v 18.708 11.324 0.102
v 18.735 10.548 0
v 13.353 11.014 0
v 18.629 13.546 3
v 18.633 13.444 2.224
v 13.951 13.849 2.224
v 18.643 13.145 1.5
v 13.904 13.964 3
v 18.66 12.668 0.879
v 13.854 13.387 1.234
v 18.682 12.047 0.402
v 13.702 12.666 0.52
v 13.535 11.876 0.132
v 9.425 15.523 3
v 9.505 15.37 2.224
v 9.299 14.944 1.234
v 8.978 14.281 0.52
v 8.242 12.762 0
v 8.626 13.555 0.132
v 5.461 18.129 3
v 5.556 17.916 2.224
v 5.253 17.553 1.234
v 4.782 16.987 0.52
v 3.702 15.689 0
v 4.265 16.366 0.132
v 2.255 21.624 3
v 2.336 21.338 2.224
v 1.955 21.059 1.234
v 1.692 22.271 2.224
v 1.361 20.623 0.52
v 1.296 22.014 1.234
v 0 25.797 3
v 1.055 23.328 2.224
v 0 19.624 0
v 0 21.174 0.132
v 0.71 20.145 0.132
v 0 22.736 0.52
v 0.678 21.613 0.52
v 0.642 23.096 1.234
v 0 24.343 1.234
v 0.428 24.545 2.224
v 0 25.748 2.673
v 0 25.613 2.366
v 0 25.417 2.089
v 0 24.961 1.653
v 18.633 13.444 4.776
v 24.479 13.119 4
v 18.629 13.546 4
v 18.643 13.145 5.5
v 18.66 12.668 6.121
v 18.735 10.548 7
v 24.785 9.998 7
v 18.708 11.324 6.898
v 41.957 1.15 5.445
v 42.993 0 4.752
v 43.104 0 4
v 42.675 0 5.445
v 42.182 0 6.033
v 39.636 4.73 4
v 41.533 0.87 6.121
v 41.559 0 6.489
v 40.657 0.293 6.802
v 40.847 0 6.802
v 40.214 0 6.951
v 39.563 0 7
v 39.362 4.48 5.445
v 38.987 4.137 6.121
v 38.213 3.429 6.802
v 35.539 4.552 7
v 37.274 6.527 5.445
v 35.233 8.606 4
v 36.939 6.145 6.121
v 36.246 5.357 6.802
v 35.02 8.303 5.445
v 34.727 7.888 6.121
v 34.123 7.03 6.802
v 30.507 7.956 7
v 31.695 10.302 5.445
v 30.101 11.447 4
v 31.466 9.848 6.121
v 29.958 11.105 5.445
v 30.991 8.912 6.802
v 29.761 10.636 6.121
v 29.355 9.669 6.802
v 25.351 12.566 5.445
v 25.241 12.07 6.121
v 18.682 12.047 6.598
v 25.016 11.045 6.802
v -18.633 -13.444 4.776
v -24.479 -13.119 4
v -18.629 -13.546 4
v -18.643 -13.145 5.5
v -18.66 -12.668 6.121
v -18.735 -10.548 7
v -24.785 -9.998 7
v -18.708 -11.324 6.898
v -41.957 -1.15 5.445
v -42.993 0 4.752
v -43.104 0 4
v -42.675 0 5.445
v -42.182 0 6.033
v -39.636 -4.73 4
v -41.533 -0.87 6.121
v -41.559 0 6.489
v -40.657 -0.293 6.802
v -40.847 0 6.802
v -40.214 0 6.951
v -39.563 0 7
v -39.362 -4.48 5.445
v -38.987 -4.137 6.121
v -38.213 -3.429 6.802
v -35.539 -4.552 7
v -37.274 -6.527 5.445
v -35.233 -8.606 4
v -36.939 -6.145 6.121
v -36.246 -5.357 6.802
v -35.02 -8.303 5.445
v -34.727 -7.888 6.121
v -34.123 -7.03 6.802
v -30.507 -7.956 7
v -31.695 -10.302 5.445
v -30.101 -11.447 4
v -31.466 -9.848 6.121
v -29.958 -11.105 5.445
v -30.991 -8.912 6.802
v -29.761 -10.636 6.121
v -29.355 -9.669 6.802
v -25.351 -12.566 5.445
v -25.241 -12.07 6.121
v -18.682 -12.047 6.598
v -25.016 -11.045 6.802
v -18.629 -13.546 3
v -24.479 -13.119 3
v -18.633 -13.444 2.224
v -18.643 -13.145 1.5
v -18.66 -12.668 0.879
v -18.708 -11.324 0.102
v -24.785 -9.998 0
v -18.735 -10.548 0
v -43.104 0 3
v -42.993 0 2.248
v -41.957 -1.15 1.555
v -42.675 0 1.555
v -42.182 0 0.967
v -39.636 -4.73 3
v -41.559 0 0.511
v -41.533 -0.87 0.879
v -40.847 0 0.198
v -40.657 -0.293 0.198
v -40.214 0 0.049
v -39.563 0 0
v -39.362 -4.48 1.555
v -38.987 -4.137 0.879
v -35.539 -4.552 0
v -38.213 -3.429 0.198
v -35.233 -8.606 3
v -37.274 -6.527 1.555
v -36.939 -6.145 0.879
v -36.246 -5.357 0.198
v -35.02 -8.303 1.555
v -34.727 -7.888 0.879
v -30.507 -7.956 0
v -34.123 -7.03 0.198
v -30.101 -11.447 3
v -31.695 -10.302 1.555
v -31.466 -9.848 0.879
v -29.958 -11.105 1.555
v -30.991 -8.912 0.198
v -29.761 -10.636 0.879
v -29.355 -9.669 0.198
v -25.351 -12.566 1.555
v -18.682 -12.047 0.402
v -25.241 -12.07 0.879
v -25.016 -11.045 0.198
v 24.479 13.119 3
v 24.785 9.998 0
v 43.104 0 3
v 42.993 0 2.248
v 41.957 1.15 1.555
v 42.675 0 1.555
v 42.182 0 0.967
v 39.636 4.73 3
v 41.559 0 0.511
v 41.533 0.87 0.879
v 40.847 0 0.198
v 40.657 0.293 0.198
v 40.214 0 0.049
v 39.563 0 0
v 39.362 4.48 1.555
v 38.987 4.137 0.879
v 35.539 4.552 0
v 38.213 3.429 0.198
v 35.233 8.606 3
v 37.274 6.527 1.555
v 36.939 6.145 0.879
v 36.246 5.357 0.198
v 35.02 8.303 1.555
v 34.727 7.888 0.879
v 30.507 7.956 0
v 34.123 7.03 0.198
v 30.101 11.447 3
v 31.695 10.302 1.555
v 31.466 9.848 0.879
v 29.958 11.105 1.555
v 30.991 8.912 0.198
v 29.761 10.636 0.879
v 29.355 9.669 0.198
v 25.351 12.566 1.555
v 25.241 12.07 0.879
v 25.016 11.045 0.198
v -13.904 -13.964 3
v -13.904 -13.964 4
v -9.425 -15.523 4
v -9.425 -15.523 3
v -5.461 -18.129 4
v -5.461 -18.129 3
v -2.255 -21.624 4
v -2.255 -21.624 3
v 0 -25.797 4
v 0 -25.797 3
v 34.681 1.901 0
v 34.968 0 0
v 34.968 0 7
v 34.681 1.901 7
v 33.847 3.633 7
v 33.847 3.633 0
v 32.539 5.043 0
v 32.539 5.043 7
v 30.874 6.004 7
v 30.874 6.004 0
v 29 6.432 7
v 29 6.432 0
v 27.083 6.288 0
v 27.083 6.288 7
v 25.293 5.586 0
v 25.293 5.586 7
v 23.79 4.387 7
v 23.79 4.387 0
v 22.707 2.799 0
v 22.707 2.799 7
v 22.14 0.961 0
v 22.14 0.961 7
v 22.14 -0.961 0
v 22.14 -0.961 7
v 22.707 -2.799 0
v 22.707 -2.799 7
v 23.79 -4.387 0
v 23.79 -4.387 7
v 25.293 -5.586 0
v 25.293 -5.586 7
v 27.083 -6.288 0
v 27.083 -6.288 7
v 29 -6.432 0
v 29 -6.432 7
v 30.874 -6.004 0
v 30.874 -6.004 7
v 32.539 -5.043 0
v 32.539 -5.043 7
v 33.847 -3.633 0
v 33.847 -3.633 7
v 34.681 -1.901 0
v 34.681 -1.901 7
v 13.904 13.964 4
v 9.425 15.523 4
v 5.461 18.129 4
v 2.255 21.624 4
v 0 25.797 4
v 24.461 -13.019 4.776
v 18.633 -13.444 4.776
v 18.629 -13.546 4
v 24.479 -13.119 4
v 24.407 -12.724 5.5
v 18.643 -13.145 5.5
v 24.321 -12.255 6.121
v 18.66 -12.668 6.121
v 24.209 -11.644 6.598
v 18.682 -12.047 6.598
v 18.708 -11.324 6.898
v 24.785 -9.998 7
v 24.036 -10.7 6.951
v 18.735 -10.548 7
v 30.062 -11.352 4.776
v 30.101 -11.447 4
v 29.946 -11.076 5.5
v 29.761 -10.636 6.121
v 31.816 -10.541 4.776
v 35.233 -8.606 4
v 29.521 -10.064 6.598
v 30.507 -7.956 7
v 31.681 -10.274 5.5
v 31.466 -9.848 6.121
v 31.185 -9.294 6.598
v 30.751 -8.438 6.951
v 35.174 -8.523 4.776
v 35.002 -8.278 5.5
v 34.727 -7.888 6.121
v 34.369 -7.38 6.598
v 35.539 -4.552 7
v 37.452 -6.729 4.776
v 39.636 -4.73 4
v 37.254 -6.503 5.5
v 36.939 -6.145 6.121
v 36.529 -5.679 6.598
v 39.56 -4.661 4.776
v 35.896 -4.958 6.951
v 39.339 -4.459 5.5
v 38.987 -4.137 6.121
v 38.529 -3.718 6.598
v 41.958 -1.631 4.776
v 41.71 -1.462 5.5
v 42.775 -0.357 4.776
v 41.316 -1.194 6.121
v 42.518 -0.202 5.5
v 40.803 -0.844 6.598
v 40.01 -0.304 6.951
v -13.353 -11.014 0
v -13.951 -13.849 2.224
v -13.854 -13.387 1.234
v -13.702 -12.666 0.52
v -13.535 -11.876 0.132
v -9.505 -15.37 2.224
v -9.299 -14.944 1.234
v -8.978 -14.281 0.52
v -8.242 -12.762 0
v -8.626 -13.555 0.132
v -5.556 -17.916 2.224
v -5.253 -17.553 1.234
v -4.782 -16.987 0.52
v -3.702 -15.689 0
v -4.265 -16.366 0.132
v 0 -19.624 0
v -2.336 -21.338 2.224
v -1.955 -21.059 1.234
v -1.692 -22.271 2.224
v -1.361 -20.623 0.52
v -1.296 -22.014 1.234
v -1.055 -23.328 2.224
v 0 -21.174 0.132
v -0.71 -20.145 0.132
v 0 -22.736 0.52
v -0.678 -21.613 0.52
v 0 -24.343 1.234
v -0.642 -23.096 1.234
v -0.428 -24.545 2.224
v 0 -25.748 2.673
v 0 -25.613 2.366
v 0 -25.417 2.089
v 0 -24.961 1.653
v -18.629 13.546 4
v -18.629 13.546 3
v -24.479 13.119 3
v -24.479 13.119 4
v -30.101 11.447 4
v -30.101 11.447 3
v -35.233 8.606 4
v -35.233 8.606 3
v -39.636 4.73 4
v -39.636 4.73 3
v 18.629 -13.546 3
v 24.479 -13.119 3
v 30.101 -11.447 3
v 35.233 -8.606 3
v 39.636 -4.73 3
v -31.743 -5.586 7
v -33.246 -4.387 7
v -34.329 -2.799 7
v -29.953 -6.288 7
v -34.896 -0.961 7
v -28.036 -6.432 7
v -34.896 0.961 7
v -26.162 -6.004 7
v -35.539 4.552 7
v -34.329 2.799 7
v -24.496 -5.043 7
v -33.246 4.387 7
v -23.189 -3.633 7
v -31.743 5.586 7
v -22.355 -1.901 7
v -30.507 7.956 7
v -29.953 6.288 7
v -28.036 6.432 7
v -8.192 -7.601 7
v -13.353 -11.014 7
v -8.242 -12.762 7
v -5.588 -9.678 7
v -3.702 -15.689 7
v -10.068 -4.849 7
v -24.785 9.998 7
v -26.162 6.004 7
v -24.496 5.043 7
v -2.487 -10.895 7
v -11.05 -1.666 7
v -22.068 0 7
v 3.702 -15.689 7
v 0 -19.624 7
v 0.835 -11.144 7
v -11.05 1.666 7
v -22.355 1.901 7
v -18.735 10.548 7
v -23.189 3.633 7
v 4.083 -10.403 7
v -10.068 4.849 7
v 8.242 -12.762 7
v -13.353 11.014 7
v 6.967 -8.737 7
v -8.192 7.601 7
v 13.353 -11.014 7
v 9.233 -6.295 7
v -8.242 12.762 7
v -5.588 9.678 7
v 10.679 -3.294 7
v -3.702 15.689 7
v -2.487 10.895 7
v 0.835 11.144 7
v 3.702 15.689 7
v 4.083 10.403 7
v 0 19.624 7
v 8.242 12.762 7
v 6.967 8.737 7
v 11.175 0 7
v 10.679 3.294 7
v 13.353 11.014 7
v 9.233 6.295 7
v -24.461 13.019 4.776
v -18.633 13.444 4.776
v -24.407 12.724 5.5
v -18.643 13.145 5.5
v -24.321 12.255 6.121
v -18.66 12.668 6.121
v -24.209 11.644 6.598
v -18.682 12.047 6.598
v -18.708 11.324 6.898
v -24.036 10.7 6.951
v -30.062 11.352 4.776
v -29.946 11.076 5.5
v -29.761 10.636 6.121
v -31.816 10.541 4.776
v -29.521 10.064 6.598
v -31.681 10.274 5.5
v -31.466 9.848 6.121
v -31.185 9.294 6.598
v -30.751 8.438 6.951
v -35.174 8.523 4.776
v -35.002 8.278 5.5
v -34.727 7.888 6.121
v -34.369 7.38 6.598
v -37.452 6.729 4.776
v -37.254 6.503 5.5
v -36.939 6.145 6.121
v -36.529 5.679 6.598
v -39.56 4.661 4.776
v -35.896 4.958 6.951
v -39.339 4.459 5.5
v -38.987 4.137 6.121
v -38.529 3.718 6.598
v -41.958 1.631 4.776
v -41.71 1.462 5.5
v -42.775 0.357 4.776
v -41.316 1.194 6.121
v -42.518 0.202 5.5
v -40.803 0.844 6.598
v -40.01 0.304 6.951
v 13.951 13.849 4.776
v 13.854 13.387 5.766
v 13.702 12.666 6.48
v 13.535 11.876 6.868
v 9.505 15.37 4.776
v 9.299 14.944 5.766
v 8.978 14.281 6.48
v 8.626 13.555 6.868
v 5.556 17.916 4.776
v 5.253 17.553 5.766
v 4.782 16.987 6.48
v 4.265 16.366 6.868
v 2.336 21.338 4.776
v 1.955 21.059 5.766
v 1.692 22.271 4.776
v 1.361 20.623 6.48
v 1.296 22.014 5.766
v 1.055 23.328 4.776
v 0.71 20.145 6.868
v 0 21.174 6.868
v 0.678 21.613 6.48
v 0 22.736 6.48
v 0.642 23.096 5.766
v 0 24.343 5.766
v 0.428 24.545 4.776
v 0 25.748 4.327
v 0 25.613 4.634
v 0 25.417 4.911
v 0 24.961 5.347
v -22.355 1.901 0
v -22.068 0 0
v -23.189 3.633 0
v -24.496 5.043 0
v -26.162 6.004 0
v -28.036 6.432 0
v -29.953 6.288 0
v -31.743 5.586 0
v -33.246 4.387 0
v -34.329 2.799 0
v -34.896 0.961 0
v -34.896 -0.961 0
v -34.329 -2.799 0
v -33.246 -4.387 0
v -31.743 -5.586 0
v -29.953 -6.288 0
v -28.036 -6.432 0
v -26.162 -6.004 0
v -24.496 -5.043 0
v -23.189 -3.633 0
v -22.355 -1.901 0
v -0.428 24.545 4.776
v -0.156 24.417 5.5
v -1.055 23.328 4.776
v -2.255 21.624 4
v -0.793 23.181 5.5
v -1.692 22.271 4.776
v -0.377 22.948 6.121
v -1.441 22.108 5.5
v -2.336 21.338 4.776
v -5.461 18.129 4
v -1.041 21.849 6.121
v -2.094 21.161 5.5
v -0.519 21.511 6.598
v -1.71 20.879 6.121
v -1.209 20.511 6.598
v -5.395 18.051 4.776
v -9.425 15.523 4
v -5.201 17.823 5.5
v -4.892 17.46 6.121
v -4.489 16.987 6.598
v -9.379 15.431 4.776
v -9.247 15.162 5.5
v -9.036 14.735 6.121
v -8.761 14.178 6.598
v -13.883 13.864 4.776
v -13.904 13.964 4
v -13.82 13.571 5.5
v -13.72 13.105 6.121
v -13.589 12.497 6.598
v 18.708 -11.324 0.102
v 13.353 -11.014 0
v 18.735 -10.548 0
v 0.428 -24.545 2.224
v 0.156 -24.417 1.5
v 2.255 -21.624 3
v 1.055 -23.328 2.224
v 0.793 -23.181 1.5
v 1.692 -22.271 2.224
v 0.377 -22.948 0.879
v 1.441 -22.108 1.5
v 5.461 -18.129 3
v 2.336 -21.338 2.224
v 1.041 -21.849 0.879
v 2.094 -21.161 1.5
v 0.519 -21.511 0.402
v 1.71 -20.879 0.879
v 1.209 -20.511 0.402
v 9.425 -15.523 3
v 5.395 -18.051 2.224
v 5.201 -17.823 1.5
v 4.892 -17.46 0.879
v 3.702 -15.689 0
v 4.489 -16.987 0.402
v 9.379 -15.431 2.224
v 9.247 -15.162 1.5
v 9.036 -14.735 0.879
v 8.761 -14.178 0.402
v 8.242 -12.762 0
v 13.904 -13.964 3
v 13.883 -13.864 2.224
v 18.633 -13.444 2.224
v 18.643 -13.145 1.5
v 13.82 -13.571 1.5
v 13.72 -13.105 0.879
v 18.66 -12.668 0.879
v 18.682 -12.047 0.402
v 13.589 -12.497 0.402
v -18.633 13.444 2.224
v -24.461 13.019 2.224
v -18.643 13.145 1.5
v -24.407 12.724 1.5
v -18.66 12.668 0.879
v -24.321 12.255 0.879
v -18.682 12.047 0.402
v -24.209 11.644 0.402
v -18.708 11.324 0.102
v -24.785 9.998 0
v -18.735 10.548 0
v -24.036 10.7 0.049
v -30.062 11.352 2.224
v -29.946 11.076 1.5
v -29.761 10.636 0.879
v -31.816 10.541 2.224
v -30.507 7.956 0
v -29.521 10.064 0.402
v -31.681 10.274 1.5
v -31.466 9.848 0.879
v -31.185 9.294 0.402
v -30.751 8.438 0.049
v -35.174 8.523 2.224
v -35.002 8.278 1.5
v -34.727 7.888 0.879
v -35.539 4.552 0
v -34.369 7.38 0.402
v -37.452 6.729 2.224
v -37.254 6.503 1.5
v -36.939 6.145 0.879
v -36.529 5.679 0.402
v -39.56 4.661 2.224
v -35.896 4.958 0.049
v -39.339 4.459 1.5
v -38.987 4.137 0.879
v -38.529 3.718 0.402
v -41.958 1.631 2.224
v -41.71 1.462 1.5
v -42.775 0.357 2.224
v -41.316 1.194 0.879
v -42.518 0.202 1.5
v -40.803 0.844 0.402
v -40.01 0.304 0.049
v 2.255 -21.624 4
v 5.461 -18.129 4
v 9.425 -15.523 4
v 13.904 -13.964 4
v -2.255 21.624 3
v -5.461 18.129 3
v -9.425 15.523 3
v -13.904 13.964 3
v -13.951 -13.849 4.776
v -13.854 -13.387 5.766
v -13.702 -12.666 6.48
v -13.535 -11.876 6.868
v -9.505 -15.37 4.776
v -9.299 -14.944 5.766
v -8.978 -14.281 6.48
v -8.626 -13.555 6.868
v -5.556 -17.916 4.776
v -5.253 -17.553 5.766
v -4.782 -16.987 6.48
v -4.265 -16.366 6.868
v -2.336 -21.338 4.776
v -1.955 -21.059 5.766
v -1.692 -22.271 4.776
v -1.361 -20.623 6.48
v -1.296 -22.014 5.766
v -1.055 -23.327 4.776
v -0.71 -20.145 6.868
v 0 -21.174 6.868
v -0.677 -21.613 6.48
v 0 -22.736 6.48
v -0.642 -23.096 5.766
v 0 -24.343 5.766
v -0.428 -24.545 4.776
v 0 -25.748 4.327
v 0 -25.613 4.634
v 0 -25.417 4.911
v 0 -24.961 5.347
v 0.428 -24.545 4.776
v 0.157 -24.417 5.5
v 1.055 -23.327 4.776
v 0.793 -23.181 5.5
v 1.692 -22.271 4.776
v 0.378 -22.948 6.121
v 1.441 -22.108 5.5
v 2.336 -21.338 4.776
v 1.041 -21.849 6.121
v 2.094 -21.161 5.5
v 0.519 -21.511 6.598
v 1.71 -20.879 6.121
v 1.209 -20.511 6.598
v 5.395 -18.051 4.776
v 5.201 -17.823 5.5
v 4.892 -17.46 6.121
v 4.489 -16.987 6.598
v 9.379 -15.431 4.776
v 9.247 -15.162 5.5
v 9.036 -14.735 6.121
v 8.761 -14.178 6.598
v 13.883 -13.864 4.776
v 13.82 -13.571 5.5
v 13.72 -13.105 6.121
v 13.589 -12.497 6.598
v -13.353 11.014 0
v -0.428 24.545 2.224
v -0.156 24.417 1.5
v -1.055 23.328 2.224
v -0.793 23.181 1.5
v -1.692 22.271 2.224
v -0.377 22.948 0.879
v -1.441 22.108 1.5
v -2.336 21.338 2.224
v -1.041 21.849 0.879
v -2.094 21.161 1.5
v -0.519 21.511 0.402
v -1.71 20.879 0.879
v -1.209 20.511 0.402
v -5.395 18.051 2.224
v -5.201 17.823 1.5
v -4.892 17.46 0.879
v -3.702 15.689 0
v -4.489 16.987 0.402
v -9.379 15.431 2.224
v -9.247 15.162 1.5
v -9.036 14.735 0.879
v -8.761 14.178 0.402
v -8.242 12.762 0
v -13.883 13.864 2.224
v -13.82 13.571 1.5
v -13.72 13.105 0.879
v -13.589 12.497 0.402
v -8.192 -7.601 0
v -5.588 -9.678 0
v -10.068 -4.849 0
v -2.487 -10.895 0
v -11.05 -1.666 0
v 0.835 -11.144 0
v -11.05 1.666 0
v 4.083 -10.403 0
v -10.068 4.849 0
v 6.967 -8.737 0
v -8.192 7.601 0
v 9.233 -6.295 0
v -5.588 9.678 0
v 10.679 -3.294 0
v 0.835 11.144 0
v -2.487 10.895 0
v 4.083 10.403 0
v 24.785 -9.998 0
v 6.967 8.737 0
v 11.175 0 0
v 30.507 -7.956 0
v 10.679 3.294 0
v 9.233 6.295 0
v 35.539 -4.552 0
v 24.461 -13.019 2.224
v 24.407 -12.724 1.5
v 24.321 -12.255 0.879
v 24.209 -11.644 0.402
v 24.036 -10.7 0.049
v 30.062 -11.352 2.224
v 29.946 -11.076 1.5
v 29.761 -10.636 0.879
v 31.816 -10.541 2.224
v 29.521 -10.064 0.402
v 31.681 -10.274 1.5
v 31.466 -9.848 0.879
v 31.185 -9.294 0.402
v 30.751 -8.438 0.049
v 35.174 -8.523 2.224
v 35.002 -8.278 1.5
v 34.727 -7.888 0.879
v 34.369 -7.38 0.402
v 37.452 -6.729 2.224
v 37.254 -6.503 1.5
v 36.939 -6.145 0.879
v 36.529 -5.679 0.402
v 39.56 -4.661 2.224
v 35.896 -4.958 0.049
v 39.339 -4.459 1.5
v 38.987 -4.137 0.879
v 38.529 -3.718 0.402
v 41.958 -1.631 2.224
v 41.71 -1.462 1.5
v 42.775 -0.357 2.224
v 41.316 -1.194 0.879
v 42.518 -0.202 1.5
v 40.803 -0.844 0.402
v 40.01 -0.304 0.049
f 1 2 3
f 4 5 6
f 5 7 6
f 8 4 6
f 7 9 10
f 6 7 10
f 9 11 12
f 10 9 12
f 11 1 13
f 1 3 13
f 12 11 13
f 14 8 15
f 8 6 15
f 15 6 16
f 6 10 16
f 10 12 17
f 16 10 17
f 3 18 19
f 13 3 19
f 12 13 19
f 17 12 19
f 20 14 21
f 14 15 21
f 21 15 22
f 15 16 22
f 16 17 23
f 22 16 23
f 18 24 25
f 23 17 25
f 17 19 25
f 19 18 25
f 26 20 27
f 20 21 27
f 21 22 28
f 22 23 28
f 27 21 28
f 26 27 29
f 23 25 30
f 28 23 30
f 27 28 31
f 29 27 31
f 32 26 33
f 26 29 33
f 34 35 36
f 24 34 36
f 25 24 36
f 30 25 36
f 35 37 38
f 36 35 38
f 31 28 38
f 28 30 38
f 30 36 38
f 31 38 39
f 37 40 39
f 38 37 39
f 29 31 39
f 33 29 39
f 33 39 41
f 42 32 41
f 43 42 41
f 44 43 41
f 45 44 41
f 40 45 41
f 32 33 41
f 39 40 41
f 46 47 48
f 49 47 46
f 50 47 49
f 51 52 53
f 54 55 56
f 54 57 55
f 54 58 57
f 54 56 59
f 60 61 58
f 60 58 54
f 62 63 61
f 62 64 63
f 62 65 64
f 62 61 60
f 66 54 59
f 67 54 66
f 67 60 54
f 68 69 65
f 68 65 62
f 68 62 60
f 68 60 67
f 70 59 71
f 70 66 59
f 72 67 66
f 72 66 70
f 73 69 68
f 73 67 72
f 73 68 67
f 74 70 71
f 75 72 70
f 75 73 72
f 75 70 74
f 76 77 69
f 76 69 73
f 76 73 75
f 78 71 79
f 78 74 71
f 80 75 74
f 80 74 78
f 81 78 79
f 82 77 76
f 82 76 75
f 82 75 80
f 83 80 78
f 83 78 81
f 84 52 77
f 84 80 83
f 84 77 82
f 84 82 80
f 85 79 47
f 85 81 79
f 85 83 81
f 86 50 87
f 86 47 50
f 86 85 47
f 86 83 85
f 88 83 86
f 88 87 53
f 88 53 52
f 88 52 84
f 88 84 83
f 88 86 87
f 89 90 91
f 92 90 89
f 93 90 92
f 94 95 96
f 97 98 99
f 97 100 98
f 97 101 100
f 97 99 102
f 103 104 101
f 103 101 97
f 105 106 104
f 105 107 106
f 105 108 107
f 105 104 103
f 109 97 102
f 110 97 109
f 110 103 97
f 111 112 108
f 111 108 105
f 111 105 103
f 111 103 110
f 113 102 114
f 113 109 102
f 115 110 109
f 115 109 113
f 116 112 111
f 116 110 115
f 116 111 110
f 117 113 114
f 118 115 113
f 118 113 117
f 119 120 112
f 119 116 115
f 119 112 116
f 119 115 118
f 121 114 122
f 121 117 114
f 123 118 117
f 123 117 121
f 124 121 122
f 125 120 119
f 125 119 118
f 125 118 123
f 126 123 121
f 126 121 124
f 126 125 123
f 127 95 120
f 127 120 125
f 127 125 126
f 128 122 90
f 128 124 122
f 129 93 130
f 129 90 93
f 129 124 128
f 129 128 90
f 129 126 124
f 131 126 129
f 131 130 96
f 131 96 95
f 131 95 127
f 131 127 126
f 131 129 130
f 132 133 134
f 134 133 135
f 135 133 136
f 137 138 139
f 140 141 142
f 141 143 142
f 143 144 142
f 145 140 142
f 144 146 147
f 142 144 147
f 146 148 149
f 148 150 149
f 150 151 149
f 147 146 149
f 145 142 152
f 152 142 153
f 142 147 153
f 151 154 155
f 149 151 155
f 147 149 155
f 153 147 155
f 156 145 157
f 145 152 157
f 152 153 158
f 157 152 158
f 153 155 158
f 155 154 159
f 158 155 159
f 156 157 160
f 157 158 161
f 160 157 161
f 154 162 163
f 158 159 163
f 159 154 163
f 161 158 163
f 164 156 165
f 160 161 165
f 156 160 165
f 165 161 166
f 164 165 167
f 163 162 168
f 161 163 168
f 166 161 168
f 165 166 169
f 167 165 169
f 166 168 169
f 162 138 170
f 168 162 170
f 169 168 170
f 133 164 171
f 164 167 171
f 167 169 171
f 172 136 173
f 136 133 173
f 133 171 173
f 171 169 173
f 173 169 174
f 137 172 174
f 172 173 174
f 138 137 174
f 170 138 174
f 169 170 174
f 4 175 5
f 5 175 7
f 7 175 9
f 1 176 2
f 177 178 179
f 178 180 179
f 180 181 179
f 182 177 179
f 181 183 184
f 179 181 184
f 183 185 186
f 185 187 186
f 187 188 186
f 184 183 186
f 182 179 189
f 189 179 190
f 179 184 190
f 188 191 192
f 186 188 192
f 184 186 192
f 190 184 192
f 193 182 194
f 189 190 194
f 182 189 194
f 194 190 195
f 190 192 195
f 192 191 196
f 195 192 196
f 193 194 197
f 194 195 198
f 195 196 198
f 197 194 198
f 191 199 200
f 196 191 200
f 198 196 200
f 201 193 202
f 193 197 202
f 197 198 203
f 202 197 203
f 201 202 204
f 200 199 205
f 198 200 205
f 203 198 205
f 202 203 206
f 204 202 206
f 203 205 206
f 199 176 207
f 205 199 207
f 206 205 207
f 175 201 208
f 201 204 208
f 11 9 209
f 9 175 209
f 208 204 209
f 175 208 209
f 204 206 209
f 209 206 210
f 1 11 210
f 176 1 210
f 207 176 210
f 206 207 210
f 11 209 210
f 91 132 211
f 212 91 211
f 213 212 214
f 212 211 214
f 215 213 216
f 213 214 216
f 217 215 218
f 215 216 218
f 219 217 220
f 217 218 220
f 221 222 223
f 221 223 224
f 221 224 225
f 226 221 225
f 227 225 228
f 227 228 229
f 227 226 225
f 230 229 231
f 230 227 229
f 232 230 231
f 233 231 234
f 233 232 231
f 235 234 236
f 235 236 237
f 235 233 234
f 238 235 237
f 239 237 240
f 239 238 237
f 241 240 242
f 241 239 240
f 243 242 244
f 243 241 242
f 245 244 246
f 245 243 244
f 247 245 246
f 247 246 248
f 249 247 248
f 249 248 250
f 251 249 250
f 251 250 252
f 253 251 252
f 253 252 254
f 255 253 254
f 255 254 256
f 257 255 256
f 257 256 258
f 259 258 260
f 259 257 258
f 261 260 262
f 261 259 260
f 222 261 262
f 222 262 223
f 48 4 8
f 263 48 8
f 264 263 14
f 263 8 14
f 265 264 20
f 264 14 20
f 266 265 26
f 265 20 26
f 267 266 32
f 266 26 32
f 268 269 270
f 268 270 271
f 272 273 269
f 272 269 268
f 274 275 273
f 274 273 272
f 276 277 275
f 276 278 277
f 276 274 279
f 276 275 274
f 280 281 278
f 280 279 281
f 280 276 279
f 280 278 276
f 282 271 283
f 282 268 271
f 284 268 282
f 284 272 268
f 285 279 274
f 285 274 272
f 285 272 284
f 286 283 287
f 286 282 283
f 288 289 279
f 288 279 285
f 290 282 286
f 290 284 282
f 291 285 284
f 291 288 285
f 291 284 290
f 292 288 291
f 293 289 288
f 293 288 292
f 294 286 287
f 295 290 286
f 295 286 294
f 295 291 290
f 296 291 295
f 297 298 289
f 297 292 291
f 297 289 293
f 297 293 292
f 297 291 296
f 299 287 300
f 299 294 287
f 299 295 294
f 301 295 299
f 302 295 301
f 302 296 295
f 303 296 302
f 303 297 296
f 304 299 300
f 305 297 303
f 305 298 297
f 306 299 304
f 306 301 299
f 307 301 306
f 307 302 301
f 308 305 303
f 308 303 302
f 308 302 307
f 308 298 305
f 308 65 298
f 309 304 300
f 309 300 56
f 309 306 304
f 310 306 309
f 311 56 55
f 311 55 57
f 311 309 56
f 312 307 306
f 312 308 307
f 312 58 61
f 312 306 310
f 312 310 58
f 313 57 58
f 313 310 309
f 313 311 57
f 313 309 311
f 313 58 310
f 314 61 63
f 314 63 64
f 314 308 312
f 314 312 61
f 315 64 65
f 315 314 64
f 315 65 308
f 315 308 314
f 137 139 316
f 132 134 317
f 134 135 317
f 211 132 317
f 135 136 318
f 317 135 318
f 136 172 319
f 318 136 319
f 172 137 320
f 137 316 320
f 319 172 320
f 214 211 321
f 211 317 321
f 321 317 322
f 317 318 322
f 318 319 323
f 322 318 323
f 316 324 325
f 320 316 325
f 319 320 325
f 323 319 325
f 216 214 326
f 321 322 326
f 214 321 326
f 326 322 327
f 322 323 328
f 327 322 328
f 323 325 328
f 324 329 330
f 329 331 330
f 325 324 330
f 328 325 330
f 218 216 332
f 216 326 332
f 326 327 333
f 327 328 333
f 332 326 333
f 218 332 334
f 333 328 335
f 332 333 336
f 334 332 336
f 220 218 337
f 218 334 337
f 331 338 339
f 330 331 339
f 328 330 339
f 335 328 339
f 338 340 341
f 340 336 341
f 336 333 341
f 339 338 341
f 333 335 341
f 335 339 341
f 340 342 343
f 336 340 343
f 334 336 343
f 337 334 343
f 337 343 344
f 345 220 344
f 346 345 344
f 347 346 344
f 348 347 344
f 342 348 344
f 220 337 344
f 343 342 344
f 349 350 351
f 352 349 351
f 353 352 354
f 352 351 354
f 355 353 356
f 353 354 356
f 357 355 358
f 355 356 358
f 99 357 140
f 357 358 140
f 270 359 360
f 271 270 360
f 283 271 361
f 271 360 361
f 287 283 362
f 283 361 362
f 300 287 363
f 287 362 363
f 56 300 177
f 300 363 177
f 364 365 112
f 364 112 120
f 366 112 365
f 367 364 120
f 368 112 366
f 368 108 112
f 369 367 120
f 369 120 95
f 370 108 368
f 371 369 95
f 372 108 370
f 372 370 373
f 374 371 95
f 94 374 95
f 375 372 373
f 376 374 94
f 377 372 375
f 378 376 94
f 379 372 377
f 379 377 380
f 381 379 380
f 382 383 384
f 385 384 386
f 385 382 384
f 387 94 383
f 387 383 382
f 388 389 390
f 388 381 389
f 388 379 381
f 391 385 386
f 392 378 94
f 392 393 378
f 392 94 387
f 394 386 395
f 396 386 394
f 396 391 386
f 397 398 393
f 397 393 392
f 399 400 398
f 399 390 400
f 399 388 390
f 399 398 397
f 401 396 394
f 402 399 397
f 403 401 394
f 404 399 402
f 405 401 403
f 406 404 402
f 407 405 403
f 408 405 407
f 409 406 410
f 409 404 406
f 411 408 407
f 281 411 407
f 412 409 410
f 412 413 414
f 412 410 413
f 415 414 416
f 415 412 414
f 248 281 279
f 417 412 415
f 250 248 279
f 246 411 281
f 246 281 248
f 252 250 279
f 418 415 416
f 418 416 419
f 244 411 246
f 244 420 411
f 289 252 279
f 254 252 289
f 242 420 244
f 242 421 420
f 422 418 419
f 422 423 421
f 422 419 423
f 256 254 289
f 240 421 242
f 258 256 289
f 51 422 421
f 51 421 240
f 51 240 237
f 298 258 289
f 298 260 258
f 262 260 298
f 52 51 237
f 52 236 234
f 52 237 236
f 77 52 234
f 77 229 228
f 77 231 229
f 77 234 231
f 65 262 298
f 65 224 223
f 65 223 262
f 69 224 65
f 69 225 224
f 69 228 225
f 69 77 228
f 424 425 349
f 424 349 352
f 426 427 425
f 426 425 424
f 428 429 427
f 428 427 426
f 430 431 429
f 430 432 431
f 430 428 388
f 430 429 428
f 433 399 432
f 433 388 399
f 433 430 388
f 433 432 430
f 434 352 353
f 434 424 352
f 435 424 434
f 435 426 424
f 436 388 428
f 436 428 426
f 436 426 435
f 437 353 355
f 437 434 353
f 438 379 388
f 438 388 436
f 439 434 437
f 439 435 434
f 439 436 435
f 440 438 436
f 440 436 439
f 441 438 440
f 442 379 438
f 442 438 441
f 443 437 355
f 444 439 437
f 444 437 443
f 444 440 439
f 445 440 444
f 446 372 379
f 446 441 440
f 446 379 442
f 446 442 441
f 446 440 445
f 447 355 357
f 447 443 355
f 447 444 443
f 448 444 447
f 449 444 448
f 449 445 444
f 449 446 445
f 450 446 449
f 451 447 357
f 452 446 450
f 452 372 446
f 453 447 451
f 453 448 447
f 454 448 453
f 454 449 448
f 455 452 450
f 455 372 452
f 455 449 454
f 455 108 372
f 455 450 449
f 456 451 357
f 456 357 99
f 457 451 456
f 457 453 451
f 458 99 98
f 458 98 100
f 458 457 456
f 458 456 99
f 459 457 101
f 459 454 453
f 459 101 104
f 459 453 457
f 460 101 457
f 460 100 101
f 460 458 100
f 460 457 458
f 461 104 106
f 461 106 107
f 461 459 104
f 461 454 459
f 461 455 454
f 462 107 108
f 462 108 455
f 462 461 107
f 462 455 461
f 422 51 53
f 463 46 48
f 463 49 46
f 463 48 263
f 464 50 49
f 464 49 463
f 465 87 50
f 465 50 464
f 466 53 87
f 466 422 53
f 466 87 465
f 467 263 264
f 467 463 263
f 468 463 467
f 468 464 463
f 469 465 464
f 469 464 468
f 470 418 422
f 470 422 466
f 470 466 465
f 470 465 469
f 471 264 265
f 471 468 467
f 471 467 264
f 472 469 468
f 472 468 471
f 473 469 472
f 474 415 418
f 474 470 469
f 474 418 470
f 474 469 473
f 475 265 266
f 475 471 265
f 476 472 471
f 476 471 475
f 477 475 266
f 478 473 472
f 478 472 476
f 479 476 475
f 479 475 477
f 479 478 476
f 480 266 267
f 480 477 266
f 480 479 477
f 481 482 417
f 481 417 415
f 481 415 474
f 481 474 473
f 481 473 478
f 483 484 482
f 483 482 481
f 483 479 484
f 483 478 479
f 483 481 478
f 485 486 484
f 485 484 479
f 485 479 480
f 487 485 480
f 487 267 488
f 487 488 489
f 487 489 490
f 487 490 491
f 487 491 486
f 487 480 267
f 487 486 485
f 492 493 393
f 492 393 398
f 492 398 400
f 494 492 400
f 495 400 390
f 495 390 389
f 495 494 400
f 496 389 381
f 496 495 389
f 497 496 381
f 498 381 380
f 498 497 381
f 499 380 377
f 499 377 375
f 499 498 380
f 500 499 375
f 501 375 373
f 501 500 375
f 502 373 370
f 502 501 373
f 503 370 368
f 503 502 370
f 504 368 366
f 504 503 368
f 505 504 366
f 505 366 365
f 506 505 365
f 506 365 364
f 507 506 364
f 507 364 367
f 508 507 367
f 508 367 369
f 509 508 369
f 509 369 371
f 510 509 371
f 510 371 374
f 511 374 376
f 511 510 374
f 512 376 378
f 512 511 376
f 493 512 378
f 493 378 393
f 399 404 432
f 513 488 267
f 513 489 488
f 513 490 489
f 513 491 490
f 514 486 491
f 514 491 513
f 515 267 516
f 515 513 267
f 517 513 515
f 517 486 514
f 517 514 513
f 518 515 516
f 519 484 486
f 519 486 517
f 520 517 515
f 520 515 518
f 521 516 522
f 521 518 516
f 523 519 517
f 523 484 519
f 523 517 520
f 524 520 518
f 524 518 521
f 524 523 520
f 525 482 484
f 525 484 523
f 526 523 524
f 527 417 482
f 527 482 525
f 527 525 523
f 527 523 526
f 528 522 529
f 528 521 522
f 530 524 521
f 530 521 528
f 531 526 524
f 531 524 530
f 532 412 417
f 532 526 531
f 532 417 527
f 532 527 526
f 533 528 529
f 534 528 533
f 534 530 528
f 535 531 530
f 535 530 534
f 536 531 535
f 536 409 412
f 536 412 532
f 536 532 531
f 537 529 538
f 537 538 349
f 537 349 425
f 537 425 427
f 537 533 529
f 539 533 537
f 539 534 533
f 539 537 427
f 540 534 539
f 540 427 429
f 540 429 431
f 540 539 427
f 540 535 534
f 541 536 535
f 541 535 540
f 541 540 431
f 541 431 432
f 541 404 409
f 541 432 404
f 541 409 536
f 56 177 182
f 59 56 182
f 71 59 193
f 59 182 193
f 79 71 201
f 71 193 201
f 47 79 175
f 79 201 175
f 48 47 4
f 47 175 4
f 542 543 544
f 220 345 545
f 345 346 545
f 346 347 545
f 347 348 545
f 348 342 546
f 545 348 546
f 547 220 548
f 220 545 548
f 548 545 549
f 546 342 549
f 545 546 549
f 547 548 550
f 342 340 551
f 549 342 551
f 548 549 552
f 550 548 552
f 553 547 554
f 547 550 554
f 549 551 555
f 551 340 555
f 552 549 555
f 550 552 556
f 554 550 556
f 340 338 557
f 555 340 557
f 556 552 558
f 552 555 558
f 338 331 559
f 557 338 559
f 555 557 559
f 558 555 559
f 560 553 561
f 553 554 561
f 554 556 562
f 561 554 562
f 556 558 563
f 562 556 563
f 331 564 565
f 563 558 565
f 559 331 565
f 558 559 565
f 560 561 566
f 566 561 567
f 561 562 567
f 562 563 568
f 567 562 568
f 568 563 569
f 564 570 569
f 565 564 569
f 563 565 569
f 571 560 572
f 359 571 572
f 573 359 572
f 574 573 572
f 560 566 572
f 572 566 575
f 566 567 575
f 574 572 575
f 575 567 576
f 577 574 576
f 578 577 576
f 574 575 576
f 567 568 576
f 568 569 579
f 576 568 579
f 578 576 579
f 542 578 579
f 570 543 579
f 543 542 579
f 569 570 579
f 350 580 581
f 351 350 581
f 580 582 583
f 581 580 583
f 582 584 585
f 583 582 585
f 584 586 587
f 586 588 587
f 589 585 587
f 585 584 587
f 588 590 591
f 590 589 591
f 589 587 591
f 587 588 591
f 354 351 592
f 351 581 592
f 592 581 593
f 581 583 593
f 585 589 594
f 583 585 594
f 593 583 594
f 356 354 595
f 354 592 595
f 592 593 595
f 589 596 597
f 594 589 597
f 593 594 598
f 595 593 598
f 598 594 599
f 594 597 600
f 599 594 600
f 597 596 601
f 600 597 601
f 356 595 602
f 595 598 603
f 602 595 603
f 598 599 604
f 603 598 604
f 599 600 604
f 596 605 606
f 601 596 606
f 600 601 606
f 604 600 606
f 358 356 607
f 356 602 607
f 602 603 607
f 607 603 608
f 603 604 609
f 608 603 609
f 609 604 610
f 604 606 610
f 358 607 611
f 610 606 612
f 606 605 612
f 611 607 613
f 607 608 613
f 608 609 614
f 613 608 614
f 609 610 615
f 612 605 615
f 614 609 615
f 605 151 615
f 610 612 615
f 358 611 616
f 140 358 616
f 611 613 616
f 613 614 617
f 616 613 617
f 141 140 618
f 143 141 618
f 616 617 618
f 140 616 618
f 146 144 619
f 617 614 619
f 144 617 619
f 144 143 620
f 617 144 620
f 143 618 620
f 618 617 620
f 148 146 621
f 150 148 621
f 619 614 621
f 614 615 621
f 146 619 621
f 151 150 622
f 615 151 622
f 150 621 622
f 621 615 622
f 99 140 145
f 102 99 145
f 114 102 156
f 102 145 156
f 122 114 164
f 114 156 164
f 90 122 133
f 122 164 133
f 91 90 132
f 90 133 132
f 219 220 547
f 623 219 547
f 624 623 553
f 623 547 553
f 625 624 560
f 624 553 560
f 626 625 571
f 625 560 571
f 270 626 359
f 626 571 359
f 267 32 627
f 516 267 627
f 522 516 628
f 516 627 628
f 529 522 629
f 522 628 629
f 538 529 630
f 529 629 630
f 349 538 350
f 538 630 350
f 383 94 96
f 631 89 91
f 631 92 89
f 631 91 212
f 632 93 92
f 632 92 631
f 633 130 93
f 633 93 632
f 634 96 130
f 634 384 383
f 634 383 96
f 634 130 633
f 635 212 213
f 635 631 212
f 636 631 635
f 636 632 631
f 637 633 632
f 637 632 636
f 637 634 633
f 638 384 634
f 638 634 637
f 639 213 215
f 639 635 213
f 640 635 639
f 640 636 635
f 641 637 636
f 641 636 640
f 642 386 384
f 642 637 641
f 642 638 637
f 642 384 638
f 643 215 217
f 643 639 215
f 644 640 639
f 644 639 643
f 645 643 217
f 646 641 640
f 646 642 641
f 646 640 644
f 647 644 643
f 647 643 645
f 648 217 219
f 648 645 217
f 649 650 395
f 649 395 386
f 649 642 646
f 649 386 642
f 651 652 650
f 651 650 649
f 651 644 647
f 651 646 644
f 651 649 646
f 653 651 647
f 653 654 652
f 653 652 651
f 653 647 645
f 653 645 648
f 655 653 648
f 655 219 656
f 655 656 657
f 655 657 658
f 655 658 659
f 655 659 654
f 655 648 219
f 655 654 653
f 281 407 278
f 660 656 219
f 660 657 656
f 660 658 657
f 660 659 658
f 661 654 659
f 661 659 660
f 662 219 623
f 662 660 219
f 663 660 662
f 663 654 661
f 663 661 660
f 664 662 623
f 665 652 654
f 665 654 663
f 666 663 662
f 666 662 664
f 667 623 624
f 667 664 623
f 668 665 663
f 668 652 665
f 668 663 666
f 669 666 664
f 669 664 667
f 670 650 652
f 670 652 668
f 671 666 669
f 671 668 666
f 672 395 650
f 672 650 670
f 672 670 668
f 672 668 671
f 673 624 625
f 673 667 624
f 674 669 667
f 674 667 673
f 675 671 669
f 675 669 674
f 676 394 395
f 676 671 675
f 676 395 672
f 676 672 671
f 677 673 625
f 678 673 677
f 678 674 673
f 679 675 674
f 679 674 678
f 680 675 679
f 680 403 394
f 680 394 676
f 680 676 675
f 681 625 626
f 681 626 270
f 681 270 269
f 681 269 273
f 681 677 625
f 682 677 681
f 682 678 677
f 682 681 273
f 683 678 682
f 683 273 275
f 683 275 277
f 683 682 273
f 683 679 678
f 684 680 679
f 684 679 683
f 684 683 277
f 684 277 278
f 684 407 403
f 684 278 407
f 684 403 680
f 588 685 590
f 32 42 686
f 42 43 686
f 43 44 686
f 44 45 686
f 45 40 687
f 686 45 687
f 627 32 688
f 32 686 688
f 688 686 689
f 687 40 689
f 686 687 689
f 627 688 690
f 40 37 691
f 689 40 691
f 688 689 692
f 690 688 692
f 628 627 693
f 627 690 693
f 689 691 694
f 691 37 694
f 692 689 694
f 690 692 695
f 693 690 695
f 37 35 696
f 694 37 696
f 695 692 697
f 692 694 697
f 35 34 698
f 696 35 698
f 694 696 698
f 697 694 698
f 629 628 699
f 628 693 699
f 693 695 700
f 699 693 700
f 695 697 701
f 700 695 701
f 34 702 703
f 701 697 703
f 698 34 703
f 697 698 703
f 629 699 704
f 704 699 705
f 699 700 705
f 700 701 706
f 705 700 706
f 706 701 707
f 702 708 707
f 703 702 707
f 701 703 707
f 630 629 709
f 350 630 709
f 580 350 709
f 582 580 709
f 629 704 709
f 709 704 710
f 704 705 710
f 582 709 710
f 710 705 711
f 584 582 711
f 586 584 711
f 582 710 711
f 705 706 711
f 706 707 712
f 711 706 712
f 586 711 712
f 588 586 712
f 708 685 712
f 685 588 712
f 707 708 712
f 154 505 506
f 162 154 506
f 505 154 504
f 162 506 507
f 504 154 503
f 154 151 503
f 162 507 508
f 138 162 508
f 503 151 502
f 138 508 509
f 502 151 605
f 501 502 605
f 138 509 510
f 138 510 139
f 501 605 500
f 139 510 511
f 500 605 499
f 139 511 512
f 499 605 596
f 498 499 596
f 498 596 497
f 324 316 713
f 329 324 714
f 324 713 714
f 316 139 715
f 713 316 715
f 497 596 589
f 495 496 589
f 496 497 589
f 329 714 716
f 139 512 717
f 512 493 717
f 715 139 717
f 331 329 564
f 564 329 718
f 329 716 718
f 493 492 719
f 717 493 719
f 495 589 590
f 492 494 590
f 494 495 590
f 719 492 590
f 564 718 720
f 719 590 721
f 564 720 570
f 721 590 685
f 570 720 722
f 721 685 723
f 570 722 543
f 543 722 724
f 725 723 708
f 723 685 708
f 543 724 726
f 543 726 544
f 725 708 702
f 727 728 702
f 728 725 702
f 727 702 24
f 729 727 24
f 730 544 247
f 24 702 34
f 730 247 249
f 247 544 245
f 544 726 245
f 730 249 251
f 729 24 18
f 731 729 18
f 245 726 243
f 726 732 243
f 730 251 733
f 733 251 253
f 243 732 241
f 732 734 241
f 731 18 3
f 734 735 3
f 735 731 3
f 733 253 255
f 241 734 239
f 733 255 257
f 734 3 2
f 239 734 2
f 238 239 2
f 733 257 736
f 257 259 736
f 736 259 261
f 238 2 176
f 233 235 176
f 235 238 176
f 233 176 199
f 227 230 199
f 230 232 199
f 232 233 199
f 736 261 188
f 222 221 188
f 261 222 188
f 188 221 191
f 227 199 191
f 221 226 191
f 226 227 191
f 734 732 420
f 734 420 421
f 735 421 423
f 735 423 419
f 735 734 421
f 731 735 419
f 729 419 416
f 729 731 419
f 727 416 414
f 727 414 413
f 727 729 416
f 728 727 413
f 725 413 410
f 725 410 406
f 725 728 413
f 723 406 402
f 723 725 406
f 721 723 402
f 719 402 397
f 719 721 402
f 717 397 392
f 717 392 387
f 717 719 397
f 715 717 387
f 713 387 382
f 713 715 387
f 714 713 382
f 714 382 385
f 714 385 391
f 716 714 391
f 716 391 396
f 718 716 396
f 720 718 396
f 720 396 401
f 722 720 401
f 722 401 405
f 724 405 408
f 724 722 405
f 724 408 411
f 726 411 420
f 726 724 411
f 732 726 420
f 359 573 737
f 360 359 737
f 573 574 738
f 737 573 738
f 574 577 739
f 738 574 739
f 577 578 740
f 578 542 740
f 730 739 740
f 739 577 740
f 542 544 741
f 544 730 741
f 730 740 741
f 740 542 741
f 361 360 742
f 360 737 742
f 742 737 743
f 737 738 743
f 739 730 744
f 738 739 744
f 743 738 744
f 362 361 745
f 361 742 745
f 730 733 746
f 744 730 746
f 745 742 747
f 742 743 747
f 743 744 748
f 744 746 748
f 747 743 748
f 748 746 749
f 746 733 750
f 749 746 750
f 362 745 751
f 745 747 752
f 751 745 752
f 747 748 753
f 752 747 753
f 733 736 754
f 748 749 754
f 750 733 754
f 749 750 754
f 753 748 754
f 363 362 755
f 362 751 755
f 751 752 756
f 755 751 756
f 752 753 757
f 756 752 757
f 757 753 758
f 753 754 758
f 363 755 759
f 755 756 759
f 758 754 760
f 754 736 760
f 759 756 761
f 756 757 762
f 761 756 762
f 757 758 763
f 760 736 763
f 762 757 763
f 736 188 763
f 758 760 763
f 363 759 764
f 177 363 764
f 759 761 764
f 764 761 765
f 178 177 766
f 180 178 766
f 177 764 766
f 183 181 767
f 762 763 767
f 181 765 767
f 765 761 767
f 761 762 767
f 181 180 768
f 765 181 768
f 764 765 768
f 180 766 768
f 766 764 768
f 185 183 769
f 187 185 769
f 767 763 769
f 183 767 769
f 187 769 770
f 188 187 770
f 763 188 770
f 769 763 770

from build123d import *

# Parameters (mm, degrees)
F0_R     = 6.45
F0_R_2   = 11.175
F1_DEPTH = 7
F2_R     = 3


with BuildPart() as f1:
    # F0 (on Top) → F1 (new body)
    with BuildSketch(Plane.XY):
        with BuildLine():
            ThreePointArc((9.599923, 11.660709), (13.65884, 6.447227), (15.103995, 0))
            ThreePointArc((15.103995, 0), (13.65884, -6.447227), (9.599923, -11.660709))
            ThreePointArc((9.599923, -11.660709), (14.033897, -12.989573), (18.629101, -13.546434))
            ThreePointArc((18.629101, -13.546434), (32.744063, -10.165399), (43.103995, 0))
            ThreePointArc((43.103995, 0), (32.744063, 10.165399), (18.629101, 13.546434))
            ThreePointArc((18.629101, 13.546434), (14.033897, 12.989573), (9.599923, 11.660709))
        make_face()
        with Locations((28.517951, 0)):
            Circle(F0_R, mode=Mode.SUBTRACT)
        with BuildLine():
            ThreePointArc((-9.599923, 11.660709), (0, 15.103995), (9.599923, 11.660709))
            ThreePointArc((9.599923, 11.660709), (14.033897, 12.989573), (18.629101, 13.546434))
            ThreePointArc((18.629101, 13.546434), (7.362471, 16.703494), (0, 25.797338))
            ThreePointArc((0, 25.797338), (-7.362471, 16.703494), (-18.629101, 13.546434))
            ThreePointArc((-18.629101, 13.546434), (-14.033897, 12.989573), (-9.599923, 11.660709))
        make_face()
        with BuildLine():
            ThreePointArc((18.629101, -13.546434), (14.033897, -12.989573), (9.599923, -11.660709))
            ThreePointArc((9.599923, -11.660709), (0, -15.103995), (-9.599923, -11.660709))
            ThreePointArc((-9.599923, -11.660709), (-14.033897, -12.989573), (-18.629101, -13.546434))
            ThreePointArc((-18.629101, -13.546434), (-7.362471, -16.703494), (0, -25.797338))
            ThreePointArc((0, -25.797338), (7.362471, -16.703494), (18.629101, -13.546434))
        make_face()
        with BuildLine():
            ThreePointArc((-9.599923, -11.660709), (-15.103995, 0), (-9.599923, 11.660709))
            ThreePointArc((-9.599923, 11.660709), (-14.033897, 12.989573), (-18.629101, 13.546434))
            ThreePointArc((-18.629101, 13.546434), (-32.744063, 10.165399), (-43.103995, 0))
            ThreePointArc((-43.103995, 0), (-32.744063, -10.165399), (-18.629101, -13.546434))
            ThreePointArc((-18.629101, -13.546434), (-14.033897, -12.989573), (-9.599923, -11.660709))
        make_face()
        with Locations((-28.517951, 0)):
            Circle(F0_R, mode=Mode.SUBTRACT)
        with BuildLine():
            ThreePointArc((9.599923, -11.660709), (13.65884, -6.447227), (15.103995, 0))
            ThreePointArc((15.103995, 0), (13.65884, 6.447227), (9.599923, 11.660709))
            ThreePointArc((9.599923, 11.660709), (0, 15.103995), (-9.599923, 11.660709))
            ThreePointArc((-9.599923, 11.660709), (-15.103995, 0), (-9.599923, -11.660709))
            ThreePointArc((-9.599923, -11.660709), (0, -15.103995), (9.599923, -11.660709))
        make_face()
        Circle(F0_R_2, mode=Mode.SUBTRACT)
    extrude(amount=F1_DEPTH)

    # F2
    f2_edges = [f1.edges().sort_by_distance(p)[0] for p in [
        (7.362471, -16.703494, 7),
        (32.744063, -10.165399, 7),
        (32.744063, 10.165399, 7),
        (7.362471, 16.703494, 7),
        (-7.362471, 16.703494, 7),
        (-32.744063, -10.165399, 7),
        (-7.362471, -16.703494, 7),
        (-32.744063, 10.165399, 7),
        (7.362471, -16.703494, 0),
        (32.744063, -10.165399, 0),
        (-7.362471, -16.703494, 0),
        (-32.744063, -10.165399, 0),
        (-32.744063, 10.165399, 0),
        (-7.362471, 16.703494, 0),
        (7.362471, 16.703494, 0),
        (32.744063, 10.165399, 0),
    ]]
    fillet(f2_edges, radius=F2_R)


solid = f1.part
